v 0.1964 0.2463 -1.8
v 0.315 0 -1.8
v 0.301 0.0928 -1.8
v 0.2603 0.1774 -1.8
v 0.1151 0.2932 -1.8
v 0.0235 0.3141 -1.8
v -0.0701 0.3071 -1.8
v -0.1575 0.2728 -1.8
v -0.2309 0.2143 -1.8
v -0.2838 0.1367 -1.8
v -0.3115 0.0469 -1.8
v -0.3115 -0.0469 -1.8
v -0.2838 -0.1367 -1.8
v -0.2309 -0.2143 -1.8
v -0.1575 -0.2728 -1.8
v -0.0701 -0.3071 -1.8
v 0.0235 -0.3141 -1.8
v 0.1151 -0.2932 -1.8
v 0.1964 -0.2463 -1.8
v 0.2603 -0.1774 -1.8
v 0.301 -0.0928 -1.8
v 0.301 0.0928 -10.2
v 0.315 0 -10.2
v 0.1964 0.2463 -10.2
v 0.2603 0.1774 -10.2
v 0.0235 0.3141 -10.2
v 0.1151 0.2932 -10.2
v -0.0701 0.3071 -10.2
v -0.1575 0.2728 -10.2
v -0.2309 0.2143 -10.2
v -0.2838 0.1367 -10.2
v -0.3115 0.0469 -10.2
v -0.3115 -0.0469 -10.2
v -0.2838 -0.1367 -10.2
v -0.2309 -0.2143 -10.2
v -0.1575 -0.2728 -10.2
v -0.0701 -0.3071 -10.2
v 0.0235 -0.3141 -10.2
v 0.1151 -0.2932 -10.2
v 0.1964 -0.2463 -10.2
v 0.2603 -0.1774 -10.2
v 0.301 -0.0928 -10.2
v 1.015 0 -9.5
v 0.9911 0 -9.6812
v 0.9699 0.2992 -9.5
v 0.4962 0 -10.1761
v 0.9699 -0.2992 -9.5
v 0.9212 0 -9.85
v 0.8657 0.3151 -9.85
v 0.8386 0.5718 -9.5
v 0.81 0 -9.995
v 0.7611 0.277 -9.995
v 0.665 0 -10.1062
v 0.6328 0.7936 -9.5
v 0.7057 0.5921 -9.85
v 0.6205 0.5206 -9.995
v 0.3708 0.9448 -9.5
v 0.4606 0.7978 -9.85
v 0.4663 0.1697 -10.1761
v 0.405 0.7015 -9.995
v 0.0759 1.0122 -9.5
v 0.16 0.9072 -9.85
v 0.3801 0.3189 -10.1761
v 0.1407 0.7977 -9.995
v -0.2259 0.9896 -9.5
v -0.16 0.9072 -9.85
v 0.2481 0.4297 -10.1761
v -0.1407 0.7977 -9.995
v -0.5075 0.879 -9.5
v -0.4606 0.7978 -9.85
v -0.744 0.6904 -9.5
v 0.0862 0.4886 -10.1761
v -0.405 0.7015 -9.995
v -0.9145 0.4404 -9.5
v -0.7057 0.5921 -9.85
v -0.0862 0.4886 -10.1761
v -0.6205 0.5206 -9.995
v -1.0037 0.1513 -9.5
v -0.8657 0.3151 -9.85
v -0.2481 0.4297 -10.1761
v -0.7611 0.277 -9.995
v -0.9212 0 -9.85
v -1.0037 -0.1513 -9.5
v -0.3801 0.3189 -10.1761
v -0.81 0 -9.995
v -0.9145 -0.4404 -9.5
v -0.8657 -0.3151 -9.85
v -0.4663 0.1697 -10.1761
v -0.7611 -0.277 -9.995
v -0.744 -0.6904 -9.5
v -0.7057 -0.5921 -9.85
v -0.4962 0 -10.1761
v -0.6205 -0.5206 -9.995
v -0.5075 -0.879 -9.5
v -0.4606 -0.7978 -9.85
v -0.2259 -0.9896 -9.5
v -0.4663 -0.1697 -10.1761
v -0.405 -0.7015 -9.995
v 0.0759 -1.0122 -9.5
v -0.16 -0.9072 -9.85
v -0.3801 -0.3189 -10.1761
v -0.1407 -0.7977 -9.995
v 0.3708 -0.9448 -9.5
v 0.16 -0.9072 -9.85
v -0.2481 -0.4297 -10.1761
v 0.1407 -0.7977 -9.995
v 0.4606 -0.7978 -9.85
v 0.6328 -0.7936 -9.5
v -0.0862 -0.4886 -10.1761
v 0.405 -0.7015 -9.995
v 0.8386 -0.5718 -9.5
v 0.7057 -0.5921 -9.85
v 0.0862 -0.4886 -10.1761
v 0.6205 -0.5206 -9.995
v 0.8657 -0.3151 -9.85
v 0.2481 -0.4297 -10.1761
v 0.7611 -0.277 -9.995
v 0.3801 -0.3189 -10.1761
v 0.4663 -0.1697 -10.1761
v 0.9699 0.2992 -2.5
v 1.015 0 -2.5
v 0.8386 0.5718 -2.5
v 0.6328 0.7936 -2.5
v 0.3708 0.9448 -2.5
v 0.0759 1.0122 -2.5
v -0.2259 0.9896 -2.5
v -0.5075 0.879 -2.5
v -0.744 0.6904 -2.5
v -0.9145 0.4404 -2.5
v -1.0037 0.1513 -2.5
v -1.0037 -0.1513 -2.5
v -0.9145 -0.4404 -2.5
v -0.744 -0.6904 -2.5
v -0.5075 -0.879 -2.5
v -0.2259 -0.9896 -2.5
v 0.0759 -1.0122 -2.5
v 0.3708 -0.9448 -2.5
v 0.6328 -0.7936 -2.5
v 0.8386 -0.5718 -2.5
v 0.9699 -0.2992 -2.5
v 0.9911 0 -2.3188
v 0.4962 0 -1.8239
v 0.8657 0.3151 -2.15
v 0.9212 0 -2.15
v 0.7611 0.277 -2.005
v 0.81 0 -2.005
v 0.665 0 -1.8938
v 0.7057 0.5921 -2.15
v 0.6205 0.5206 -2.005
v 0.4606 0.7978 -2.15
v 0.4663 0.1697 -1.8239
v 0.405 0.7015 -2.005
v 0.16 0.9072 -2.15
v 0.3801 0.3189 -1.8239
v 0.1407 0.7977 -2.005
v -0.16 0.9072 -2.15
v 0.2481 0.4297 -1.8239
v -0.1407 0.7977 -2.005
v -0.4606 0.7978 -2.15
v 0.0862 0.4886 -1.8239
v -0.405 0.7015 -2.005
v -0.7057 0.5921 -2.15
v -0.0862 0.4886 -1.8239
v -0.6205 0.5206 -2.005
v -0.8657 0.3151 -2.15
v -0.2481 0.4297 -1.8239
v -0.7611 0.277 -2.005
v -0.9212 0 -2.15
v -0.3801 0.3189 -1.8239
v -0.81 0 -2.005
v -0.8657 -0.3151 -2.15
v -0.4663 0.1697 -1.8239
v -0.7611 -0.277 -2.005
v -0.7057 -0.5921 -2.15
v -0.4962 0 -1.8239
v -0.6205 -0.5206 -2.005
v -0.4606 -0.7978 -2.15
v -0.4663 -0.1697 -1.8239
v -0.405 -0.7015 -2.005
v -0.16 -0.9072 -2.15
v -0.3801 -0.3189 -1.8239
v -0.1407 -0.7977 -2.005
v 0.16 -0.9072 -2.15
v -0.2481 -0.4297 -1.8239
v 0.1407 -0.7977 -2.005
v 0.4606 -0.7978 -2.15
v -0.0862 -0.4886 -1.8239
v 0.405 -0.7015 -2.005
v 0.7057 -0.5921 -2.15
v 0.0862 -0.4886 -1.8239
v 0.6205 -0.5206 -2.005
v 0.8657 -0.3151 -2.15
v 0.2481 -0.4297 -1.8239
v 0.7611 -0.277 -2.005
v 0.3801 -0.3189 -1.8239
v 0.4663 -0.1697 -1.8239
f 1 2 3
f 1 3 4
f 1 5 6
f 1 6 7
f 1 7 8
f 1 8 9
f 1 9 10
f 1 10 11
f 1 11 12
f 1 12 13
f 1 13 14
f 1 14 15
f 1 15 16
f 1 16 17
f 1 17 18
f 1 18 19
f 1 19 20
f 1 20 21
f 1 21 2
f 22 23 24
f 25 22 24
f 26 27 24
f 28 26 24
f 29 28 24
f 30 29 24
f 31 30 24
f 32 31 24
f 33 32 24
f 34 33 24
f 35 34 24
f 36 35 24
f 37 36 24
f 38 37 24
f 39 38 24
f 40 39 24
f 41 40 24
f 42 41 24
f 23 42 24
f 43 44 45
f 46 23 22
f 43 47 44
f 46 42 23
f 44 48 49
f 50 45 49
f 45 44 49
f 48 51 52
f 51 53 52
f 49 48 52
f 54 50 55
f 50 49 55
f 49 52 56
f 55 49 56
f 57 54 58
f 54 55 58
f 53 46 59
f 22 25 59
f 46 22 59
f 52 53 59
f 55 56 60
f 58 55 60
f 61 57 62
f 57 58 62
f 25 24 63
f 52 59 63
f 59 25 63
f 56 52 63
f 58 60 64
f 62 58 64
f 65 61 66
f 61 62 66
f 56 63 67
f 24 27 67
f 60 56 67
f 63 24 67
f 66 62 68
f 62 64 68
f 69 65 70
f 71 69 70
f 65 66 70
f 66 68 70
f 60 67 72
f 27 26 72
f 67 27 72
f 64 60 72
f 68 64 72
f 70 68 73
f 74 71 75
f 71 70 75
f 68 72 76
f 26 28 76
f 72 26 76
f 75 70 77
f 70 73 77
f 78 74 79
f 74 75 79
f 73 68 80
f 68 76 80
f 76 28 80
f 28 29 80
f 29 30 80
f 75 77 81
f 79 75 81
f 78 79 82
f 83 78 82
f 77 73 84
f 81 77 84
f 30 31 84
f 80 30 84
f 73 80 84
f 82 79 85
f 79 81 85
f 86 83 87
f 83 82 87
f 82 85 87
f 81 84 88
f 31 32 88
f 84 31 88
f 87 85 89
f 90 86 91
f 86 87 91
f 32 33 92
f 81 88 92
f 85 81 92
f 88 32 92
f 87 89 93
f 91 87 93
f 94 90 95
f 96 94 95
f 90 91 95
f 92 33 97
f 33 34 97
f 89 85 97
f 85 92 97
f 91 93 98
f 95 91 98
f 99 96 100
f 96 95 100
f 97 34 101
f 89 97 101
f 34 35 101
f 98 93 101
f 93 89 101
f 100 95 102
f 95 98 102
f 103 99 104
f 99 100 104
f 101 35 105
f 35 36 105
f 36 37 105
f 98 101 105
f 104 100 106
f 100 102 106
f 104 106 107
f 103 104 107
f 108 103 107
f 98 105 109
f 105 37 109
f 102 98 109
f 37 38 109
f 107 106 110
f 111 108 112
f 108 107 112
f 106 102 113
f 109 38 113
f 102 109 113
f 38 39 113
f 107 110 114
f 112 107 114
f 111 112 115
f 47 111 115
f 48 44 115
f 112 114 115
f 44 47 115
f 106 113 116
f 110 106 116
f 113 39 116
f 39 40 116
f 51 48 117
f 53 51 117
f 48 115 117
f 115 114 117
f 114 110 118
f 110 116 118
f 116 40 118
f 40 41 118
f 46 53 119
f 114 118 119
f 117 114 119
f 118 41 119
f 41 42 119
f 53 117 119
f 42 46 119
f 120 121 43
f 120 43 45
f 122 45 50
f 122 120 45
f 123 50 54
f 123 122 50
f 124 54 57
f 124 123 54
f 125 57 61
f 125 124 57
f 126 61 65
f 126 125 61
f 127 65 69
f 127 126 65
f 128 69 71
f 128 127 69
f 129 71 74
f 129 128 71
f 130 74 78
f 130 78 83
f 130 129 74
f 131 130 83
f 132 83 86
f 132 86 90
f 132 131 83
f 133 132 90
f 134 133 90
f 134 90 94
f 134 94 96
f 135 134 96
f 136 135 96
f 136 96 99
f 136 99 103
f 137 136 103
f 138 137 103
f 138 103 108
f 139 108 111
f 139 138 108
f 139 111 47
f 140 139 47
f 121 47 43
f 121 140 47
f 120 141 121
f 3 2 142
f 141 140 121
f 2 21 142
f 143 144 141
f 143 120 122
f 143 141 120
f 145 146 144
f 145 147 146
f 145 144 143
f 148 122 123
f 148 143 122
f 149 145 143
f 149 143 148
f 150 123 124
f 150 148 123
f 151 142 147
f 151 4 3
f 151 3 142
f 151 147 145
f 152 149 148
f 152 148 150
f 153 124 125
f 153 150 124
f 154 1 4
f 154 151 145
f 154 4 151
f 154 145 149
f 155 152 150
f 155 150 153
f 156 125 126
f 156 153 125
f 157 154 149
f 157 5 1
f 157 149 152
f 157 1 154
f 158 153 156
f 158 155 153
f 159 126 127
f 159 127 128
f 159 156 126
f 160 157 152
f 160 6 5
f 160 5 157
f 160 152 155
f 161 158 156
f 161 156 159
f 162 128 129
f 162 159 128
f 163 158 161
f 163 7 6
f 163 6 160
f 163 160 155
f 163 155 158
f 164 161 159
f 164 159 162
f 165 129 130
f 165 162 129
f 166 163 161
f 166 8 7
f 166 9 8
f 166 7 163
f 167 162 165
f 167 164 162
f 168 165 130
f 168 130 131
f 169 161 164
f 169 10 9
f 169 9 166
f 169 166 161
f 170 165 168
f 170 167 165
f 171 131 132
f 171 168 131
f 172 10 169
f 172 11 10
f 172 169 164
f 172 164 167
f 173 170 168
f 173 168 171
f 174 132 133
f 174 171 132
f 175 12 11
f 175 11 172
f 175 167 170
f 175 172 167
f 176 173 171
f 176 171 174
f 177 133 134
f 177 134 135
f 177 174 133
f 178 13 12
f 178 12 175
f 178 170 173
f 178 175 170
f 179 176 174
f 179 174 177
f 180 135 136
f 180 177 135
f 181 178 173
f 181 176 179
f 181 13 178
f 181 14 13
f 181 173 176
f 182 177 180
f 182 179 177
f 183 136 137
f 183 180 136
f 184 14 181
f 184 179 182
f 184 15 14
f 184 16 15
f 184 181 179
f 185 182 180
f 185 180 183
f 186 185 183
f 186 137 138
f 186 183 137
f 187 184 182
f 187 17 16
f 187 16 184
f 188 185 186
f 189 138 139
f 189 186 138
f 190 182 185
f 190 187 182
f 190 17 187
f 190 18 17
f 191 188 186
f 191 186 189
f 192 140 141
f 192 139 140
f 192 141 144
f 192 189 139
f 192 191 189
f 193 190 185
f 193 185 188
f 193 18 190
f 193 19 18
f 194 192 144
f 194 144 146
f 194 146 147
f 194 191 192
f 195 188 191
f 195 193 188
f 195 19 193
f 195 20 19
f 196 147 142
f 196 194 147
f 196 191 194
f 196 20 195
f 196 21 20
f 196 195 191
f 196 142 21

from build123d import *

# Parameters (mm, degrees)
SKETCH1_R           = 1.45
BOSS_EXTRUDE1_DEPTH = 12
FILLET1_R           = 1
SCALE1_SCALE        = 0.7


with BuildPart() as part:
    # Sketch1 → Boss-Extrude1 (new body)
    with BuildSketch(Plane(origin=(0, 0, 0), x_dir=(0, 1, 0), z_dir=(0, 0, 1))):
        with Locations(Location((0, 0, 0), (0, 0, 270))):
            Circle(SKETCH1_R)
    extrude(amount=-BOSS_EXTRUDE1_DEPTH)

    # Fillet1
    fillet1_edges = [part.edges().sort_by_distance(p)[0] for p in [
        (-1.45, 0, 0),
        (-1.45, 0, -12),
    ]]
    fillet(fillet1_edges, radius=FILLET1_R)


with BuildPart() as part_1:
    # Scale1: scaled about (0, 0, -6)
    add(part.part.scale(SCALE1_SCALE).moved(Location((0, 0, -1.8))))


solid = part_1.part
